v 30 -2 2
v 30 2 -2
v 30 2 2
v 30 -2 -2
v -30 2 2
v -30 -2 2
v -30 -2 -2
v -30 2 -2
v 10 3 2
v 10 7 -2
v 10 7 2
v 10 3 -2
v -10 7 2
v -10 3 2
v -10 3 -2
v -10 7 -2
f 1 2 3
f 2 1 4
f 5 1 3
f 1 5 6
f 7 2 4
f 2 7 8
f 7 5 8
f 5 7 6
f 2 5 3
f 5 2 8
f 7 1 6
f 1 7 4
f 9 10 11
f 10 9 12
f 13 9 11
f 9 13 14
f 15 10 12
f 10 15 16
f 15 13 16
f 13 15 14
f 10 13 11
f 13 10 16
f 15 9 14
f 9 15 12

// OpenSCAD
$fn=60;
cube(size = [60,4,4], center = true);

translate([0,5,0])
cube(size = [20,4,4], center = true);
